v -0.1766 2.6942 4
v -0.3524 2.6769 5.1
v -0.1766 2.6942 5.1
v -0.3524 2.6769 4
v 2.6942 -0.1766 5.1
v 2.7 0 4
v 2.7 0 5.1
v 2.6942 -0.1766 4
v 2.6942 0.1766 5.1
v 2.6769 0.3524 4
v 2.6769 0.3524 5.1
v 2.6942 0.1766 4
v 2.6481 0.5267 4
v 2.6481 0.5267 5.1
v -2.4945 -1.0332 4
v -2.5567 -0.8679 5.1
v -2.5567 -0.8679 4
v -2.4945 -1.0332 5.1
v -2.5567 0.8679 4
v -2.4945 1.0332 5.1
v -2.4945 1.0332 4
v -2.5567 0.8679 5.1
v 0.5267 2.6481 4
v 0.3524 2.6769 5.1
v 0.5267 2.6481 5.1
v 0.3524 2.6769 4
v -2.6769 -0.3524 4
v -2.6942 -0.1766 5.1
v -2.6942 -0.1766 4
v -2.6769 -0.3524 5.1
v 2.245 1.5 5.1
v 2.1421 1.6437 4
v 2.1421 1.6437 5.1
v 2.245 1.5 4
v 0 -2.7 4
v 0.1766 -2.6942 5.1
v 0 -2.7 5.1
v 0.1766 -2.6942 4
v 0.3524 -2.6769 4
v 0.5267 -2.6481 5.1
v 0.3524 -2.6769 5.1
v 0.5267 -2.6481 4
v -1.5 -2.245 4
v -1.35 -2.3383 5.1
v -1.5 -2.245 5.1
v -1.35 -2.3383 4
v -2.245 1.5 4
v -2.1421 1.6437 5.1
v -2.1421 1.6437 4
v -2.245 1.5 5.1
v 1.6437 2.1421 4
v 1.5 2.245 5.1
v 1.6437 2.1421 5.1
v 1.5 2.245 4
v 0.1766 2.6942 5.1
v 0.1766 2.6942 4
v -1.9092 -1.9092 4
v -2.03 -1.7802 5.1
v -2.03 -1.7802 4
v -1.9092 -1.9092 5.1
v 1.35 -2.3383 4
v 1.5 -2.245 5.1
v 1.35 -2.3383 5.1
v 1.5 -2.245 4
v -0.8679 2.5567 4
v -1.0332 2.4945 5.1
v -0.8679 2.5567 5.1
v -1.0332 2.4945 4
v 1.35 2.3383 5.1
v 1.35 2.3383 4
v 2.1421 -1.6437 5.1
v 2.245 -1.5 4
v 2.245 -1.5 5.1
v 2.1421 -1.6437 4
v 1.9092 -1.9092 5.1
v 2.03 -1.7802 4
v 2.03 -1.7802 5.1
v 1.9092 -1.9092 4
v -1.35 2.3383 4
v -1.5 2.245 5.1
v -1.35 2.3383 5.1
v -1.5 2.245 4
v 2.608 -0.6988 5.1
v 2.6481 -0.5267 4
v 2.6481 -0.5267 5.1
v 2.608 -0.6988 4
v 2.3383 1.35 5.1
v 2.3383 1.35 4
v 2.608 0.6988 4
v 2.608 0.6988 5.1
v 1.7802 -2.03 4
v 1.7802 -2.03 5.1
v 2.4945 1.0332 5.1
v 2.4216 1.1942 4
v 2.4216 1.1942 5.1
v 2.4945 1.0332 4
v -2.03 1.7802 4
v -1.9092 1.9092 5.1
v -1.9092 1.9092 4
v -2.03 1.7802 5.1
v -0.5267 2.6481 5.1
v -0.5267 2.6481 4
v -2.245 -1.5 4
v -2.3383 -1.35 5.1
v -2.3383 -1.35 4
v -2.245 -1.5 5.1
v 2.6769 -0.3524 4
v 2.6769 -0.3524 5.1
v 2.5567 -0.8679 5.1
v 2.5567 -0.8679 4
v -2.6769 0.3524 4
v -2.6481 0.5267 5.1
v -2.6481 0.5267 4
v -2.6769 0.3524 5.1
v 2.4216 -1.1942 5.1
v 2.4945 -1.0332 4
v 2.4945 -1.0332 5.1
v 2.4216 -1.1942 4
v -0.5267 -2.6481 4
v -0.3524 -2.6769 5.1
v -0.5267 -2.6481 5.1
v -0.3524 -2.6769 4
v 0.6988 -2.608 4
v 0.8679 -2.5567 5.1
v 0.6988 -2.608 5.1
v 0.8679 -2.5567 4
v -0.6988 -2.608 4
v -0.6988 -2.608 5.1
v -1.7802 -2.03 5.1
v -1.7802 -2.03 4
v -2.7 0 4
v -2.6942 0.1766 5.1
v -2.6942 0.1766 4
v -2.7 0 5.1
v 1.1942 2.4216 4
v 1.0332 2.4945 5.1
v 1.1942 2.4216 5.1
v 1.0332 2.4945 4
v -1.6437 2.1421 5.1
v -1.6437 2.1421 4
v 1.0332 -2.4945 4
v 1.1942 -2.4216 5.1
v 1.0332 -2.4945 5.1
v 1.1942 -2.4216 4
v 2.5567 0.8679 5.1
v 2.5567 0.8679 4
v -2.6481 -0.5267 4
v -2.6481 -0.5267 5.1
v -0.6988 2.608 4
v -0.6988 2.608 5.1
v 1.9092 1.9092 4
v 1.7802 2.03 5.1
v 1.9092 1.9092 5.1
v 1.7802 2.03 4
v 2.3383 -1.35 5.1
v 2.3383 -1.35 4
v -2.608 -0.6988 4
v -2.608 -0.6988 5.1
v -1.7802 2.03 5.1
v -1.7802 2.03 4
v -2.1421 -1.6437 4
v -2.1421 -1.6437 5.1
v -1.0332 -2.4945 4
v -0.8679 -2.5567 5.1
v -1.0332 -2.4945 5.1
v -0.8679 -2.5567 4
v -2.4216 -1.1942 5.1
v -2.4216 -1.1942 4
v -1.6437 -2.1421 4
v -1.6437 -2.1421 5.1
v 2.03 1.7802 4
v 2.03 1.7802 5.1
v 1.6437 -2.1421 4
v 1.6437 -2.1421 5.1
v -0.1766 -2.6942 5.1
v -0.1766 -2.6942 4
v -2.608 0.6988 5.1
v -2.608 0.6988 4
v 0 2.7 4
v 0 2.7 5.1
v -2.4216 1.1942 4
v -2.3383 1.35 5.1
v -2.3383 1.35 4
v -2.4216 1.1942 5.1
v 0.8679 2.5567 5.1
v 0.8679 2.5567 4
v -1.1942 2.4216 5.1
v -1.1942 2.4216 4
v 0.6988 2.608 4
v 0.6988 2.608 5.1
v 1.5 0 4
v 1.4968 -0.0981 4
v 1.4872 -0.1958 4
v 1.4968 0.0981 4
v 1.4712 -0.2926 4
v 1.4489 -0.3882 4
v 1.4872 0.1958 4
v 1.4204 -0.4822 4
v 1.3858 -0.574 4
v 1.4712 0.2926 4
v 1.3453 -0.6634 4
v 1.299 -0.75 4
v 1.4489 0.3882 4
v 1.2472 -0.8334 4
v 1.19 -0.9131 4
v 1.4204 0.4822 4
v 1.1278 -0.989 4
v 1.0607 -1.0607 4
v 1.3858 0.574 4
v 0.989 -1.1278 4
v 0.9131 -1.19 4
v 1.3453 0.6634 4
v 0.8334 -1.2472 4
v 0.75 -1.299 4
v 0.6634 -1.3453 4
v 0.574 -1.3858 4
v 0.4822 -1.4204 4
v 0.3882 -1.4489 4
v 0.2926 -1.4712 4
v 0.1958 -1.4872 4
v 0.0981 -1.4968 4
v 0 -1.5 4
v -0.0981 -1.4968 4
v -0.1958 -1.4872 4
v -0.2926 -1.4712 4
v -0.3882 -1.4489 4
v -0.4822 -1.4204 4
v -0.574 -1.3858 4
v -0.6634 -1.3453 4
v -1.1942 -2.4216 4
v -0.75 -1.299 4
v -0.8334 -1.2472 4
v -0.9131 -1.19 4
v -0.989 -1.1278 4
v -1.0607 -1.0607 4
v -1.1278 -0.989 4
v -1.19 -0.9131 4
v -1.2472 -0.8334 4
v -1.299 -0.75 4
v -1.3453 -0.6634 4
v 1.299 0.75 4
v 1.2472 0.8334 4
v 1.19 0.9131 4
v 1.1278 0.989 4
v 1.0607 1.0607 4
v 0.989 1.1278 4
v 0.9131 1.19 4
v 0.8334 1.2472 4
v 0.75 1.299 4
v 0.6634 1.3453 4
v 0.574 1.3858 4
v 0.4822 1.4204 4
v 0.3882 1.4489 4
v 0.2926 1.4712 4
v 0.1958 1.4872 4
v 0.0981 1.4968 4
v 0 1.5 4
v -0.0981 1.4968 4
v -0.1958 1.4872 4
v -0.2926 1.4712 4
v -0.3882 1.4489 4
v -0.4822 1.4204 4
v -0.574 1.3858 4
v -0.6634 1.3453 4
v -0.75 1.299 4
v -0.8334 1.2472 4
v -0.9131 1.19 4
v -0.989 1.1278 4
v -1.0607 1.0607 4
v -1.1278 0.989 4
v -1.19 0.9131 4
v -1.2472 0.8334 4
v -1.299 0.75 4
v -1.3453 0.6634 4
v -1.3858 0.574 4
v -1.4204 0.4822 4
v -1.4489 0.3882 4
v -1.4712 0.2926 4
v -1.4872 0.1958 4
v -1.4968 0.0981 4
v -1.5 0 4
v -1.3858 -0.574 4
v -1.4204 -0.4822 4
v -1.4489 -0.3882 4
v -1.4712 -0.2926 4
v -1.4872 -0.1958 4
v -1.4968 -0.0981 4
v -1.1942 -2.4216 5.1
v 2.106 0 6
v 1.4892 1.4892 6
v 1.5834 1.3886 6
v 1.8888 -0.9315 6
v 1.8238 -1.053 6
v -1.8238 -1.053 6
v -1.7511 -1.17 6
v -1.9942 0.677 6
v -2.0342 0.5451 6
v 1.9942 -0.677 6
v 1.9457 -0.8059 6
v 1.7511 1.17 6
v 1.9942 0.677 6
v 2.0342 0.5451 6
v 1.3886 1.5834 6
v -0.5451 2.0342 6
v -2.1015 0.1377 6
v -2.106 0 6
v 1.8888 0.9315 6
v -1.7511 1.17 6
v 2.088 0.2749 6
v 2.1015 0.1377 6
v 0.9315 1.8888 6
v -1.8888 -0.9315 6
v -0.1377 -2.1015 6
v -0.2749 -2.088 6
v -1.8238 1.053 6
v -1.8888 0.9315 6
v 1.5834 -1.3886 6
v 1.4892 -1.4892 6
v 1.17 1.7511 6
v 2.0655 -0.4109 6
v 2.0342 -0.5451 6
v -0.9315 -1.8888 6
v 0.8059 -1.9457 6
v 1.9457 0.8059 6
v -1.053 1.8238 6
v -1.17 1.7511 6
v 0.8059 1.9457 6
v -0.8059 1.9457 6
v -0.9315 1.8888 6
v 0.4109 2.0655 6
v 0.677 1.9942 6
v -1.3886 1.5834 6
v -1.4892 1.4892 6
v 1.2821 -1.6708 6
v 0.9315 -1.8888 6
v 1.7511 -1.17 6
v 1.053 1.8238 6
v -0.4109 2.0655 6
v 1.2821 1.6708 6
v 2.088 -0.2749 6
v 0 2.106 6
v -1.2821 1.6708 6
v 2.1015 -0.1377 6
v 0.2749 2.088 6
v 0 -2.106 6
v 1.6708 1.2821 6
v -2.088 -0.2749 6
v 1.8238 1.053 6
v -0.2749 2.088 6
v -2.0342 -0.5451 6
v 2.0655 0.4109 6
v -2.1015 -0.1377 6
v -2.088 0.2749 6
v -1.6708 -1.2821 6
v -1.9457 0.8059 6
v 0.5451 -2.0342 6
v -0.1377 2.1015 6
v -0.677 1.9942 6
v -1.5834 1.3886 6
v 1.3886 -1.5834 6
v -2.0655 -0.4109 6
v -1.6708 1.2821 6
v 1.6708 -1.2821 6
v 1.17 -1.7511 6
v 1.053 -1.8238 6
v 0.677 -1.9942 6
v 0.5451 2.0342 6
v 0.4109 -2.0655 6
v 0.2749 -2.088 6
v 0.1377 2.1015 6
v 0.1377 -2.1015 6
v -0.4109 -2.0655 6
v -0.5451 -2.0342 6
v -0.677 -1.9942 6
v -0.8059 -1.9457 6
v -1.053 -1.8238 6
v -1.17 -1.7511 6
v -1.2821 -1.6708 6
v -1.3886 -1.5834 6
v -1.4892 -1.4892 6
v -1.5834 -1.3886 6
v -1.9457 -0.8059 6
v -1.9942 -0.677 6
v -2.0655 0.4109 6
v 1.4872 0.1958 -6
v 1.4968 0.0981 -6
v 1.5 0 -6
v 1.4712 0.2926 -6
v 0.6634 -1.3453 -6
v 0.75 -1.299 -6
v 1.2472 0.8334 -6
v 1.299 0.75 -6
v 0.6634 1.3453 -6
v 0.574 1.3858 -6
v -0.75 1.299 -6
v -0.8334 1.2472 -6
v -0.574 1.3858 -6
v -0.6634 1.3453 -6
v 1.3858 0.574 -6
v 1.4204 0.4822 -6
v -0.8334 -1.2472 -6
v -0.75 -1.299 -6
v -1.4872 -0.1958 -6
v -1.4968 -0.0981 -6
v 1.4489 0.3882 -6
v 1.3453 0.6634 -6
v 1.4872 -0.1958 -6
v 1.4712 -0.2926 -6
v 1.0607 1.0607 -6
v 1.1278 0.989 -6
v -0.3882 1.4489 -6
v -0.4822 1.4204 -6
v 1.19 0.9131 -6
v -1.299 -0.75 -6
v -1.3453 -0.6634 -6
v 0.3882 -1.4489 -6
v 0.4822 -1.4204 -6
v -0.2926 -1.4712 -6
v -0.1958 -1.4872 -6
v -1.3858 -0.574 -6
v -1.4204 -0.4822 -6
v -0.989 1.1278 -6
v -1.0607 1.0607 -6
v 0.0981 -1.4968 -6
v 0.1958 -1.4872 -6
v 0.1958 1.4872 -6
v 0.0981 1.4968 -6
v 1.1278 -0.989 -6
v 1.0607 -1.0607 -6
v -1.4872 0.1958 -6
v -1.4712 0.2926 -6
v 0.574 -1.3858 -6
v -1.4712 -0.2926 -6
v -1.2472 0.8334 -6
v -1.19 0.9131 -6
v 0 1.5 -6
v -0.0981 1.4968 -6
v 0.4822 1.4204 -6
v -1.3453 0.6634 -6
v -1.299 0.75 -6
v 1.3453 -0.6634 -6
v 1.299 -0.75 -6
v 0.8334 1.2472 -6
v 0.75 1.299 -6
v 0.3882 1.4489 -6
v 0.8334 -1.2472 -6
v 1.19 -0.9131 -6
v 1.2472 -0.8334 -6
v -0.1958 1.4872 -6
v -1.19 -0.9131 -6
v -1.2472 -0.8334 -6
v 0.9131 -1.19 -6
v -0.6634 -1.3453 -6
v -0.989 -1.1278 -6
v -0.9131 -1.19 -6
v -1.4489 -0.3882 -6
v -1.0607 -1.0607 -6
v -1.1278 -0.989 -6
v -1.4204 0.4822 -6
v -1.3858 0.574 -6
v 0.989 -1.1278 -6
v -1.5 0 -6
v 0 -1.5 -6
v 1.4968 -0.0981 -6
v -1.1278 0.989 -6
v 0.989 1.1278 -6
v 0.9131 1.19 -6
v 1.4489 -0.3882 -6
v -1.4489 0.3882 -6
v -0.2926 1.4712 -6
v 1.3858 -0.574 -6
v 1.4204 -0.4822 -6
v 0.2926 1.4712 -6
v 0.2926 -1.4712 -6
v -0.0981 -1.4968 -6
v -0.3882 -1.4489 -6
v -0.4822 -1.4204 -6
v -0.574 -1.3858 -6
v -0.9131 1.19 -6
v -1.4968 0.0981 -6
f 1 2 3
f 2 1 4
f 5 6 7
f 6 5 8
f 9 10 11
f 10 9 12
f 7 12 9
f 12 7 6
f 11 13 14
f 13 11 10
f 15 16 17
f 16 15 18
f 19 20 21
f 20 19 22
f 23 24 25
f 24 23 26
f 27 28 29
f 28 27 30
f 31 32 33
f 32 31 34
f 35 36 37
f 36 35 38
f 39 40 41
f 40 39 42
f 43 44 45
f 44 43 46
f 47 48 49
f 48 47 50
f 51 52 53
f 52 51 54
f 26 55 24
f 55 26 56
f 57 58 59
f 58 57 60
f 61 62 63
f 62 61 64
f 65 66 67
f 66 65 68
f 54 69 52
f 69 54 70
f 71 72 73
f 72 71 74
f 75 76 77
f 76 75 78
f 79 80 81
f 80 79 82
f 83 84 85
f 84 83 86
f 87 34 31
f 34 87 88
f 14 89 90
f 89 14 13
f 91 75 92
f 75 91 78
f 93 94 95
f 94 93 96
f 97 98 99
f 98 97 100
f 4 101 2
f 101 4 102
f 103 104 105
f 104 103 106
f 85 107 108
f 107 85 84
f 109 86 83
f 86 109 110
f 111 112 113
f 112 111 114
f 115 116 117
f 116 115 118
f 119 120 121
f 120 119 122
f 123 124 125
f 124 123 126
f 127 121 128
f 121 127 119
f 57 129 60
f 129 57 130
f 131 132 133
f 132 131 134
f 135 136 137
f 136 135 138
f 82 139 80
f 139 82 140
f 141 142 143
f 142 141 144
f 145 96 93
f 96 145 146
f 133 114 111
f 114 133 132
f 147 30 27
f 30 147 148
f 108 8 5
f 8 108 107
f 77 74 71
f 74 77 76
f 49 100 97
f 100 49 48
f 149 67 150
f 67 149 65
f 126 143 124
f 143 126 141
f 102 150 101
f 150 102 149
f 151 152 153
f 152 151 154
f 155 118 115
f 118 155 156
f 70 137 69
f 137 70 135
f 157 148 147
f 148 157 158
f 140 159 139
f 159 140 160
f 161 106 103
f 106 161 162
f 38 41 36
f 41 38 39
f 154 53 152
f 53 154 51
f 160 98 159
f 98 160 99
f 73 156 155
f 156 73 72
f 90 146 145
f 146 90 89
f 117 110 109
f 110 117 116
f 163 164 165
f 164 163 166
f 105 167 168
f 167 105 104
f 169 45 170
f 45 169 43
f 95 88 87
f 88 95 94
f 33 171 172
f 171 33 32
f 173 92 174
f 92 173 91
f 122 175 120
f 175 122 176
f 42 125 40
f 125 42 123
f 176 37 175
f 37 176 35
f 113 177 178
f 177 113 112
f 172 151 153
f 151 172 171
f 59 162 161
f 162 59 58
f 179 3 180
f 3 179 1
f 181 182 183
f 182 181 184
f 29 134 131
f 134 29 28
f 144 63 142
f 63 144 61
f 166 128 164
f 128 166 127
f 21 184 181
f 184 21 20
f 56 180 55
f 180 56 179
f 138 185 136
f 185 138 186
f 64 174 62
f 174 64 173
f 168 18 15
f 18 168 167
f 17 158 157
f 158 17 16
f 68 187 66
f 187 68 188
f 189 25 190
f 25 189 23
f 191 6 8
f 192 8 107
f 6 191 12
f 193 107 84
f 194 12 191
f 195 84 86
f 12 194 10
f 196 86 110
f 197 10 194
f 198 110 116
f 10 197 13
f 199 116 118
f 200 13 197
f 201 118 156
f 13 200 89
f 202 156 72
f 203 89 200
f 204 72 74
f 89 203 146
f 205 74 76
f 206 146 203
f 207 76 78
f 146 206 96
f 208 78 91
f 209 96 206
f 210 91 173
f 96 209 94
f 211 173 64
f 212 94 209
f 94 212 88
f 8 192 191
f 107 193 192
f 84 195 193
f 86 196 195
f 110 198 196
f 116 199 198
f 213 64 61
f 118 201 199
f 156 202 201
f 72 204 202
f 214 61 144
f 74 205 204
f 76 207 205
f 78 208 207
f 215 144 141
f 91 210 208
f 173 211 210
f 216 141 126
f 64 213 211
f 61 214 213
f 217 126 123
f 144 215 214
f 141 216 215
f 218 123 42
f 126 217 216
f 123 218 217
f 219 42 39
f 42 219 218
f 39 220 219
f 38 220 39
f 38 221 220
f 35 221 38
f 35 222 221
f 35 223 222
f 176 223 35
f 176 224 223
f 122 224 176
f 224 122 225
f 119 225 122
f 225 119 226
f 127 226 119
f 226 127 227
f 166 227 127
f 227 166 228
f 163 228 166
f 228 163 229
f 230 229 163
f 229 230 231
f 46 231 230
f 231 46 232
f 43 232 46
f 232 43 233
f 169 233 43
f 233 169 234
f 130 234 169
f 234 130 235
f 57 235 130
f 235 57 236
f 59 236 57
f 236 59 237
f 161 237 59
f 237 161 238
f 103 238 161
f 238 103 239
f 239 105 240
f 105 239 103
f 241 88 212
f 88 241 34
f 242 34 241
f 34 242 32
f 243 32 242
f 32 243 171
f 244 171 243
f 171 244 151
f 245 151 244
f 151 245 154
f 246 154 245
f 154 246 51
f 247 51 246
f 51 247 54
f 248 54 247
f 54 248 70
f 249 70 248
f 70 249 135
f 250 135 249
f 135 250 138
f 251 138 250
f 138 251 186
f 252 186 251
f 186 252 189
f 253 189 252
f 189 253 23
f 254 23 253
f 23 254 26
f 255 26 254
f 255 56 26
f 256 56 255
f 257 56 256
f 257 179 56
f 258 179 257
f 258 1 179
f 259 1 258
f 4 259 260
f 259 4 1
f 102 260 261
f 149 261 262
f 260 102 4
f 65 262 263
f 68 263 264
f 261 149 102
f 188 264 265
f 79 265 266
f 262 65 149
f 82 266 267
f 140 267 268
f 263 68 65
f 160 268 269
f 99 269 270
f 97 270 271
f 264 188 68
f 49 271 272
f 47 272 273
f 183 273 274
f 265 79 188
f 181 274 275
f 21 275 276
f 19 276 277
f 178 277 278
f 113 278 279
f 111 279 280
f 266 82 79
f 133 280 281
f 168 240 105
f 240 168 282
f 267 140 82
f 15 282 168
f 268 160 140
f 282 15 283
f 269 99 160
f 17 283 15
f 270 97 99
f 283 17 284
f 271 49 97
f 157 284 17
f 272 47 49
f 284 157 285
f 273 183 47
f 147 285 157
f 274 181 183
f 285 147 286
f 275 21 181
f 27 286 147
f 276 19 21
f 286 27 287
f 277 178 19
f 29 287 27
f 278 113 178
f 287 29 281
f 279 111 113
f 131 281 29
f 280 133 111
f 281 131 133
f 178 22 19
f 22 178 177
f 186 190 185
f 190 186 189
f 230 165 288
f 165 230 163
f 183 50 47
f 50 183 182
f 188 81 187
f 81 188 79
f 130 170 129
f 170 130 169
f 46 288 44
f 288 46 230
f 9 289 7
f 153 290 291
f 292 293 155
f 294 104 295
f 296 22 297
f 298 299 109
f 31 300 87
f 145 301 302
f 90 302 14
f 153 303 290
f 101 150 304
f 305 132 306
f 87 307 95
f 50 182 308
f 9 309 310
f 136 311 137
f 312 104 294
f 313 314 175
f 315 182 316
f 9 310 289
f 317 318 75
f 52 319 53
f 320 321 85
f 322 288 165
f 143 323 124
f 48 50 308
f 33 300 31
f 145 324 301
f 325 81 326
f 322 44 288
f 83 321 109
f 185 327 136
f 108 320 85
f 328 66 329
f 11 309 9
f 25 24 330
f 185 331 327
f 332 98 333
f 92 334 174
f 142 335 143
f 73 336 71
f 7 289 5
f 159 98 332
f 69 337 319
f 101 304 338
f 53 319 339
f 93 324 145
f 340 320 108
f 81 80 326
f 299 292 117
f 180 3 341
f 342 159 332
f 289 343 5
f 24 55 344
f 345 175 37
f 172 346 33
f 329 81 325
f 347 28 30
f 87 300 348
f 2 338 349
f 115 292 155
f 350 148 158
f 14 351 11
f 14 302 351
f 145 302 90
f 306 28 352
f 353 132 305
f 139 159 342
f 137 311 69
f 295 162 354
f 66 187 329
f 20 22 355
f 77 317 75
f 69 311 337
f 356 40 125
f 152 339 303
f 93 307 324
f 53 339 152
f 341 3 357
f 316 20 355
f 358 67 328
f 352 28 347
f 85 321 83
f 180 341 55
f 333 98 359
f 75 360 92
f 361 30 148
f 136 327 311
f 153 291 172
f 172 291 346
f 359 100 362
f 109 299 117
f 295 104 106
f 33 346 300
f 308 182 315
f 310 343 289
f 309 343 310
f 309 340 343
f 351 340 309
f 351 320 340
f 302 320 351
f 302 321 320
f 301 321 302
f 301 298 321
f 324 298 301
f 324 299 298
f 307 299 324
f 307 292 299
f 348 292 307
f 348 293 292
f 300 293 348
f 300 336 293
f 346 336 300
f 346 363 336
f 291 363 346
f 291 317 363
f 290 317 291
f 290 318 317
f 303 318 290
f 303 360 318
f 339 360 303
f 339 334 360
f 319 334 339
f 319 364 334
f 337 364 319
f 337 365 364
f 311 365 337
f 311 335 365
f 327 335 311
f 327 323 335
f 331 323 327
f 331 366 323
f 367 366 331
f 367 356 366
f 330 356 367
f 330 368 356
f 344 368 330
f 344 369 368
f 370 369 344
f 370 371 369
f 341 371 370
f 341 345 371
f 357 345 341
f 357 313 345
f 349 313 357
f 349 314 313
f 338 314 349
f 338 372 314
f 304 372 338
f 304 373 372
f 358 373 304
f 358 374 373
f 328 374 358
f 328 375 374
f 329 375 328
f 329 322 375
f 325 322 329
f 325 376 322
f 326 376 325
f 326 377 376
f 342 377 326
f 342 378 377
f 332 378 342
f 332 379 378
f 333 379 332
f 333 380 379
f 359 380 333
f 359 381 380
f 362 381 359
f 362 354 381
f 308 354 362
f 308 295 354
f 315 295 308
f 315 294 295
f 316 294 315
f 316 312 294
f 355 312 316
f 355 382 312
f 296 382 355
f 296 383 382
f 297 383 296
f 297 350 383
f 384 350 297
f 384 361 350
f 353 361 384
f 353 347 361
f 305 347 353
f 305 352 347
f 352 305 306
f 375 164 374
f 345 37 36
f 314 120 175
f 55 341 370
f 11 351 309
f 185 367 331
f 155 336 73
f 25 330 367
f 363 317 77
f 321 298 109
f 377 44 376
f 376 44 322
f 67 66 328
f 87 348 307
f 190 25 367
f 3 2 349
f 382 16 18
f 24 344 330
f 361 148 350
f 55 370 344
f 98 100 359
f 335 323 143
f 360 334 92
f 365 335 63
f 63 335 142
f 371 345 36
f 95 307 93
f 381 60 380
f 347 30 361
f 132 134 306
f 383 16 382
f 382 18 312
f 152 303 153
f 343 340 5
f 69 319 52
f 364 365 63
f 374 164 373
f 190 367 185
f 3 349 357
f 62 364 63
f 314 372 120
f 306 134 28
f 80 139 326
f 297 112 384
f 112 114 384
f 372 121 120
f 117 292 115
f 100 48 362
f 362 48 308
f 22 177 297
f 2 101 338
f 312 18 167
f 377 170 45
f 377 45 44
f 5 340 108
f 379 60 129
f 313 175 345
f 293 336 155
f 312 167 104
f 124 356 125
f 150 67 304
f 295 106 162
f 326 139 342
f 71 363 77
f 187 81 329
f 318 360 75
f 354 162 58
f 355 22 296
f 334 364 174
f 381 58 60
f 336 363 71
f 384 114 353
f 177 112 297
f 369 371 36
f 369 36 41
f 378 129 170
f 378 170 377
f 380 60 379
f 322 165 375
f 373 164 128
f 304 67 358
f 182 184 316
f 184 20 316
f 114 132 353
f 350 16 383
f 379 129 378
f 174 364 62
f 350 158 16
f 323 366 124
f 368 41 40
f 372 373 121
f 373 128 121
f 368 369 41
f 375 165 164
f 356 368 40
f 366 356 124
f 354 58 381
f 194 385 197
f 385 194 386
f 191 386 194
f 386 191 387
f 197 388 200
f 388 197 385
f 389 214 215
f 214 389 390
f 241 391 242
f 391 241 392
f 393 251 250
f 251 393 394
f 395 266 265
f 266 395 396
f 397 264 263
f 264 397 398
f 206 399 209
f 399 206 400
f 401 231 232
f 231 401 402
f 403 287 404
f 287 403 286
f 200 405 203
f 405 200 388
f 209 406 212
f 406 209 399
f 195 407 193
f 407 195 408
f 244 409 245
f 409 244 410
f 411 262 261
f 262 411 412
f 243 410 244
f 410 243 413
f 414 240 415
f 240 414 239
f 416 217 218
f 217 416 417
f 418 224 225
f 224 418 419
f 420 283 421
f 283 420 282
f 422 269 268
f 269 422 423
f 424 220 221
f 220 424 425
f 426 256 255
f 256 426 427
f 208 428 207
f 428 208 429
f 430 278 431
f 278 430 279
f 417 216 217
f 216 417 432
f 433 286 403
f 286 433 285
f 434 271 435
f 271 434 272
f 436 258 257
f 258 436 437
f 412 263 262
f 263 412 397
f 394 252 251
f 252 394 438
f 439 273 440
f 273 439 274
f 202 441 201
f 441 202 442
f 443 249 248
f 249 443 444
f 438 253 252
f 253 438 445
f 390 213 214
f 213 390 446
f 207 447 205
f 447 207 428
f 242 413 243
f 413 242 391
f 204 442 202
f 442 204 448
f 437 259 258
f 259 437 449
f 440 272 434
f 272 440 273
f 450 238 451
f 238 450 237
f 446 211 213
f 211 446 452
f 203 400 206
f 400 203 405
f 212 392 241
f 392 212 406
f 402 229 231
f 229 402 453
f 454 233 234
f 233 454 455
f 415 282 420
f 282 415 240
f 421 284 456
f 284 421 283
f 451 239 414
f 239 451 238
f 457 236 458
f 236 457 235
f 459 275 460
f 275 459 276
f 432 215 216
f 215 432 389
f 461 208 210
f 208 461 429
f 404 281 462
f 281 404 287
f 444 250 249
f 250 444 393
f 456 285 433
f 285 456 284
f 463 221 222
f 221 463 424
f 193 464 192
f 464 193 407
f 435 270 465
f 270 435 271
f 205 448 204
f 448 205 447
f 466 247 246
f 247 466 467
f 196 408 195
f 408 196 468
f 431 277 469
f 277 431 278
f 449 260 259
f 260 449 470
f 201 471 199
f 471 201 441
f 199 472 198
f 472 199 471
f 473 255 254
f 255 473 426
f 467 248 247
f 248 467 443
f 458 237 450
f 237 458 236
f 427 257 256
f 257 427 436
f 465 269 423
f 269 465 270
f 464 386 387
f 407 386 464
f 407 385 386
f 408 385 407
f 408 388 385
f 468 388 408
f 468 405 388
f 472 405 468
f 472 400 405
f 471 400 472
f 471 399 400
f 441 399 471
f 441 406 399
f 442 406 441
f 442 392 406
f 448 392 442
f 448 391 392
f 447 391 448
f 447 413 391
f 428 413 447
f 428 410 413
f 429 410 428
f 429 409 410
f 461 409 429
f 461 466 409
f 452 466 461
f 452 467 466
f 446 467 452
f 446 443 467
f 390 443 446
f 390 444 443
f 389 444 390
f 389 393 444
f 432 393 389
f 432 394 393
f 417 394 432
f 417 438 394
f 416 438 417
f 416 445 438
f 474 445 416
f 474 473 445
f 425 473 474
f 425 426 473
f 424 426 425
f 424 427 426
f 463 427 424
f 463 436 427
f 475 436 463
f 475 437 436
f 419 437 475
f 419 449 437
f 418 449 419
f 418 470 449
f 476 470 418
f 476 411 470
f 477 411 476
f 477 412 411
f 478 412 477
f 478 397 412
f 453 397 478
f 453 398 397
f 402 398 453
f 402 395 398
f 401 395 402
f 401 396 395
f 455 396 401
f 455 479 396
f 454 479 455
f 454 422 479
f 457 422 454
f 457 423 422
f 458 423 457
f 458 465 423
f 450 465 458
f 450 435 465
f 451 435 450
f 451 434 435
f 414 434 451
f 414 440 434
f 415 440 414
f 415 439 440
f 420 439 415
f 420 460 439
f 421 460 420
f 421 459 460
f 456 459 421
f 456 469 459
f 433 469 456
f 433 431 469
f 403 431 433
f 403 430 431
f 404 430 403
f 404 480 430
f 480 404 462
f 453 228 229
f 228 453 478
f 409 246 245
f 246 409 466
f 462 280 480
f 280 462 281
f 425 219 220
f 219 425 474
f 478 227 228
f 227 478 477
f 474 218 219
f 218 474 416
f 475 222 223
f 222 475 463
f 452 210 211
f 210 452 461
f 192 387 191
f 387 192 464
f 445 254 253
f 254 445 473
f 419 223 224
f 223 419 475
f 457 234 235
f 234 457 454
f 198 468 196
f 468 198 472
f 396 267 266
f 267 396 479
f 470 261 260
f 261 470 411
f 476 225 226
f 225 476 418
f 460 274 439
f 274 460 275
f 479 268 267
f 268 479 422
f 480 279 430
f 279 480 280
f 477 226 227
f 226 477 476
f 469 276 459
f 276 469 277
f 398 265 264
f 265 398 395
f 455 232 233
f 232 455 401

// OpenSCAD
$fn=96;

d_shaft = 3.0;
r_shaft = d_shaft/2;

d_head = 5.4;
r_head = d_head/2;
h_head = 2.0;

L = 10.0;

module pan_head(h=h_head, r=r_head){
    union(){
        cylinder(h=h*0.55, r=r, center=false);
        translate([0,0,h*0.55])
            cylinder(h=h*0.45, r1=r, r2=r*0.78, center=false);
    }
}

module screw_shaft(len=L, r=r_shaft){
    cylinder(h=len, r=r, center=false);
}

module pan_head_screw(){
    union(){
        screw_shaft();
        translate([0,0,L]) pan_head();
    }
}

translate([0,0,-(L + h_head)/2]) pan_head_screw();
